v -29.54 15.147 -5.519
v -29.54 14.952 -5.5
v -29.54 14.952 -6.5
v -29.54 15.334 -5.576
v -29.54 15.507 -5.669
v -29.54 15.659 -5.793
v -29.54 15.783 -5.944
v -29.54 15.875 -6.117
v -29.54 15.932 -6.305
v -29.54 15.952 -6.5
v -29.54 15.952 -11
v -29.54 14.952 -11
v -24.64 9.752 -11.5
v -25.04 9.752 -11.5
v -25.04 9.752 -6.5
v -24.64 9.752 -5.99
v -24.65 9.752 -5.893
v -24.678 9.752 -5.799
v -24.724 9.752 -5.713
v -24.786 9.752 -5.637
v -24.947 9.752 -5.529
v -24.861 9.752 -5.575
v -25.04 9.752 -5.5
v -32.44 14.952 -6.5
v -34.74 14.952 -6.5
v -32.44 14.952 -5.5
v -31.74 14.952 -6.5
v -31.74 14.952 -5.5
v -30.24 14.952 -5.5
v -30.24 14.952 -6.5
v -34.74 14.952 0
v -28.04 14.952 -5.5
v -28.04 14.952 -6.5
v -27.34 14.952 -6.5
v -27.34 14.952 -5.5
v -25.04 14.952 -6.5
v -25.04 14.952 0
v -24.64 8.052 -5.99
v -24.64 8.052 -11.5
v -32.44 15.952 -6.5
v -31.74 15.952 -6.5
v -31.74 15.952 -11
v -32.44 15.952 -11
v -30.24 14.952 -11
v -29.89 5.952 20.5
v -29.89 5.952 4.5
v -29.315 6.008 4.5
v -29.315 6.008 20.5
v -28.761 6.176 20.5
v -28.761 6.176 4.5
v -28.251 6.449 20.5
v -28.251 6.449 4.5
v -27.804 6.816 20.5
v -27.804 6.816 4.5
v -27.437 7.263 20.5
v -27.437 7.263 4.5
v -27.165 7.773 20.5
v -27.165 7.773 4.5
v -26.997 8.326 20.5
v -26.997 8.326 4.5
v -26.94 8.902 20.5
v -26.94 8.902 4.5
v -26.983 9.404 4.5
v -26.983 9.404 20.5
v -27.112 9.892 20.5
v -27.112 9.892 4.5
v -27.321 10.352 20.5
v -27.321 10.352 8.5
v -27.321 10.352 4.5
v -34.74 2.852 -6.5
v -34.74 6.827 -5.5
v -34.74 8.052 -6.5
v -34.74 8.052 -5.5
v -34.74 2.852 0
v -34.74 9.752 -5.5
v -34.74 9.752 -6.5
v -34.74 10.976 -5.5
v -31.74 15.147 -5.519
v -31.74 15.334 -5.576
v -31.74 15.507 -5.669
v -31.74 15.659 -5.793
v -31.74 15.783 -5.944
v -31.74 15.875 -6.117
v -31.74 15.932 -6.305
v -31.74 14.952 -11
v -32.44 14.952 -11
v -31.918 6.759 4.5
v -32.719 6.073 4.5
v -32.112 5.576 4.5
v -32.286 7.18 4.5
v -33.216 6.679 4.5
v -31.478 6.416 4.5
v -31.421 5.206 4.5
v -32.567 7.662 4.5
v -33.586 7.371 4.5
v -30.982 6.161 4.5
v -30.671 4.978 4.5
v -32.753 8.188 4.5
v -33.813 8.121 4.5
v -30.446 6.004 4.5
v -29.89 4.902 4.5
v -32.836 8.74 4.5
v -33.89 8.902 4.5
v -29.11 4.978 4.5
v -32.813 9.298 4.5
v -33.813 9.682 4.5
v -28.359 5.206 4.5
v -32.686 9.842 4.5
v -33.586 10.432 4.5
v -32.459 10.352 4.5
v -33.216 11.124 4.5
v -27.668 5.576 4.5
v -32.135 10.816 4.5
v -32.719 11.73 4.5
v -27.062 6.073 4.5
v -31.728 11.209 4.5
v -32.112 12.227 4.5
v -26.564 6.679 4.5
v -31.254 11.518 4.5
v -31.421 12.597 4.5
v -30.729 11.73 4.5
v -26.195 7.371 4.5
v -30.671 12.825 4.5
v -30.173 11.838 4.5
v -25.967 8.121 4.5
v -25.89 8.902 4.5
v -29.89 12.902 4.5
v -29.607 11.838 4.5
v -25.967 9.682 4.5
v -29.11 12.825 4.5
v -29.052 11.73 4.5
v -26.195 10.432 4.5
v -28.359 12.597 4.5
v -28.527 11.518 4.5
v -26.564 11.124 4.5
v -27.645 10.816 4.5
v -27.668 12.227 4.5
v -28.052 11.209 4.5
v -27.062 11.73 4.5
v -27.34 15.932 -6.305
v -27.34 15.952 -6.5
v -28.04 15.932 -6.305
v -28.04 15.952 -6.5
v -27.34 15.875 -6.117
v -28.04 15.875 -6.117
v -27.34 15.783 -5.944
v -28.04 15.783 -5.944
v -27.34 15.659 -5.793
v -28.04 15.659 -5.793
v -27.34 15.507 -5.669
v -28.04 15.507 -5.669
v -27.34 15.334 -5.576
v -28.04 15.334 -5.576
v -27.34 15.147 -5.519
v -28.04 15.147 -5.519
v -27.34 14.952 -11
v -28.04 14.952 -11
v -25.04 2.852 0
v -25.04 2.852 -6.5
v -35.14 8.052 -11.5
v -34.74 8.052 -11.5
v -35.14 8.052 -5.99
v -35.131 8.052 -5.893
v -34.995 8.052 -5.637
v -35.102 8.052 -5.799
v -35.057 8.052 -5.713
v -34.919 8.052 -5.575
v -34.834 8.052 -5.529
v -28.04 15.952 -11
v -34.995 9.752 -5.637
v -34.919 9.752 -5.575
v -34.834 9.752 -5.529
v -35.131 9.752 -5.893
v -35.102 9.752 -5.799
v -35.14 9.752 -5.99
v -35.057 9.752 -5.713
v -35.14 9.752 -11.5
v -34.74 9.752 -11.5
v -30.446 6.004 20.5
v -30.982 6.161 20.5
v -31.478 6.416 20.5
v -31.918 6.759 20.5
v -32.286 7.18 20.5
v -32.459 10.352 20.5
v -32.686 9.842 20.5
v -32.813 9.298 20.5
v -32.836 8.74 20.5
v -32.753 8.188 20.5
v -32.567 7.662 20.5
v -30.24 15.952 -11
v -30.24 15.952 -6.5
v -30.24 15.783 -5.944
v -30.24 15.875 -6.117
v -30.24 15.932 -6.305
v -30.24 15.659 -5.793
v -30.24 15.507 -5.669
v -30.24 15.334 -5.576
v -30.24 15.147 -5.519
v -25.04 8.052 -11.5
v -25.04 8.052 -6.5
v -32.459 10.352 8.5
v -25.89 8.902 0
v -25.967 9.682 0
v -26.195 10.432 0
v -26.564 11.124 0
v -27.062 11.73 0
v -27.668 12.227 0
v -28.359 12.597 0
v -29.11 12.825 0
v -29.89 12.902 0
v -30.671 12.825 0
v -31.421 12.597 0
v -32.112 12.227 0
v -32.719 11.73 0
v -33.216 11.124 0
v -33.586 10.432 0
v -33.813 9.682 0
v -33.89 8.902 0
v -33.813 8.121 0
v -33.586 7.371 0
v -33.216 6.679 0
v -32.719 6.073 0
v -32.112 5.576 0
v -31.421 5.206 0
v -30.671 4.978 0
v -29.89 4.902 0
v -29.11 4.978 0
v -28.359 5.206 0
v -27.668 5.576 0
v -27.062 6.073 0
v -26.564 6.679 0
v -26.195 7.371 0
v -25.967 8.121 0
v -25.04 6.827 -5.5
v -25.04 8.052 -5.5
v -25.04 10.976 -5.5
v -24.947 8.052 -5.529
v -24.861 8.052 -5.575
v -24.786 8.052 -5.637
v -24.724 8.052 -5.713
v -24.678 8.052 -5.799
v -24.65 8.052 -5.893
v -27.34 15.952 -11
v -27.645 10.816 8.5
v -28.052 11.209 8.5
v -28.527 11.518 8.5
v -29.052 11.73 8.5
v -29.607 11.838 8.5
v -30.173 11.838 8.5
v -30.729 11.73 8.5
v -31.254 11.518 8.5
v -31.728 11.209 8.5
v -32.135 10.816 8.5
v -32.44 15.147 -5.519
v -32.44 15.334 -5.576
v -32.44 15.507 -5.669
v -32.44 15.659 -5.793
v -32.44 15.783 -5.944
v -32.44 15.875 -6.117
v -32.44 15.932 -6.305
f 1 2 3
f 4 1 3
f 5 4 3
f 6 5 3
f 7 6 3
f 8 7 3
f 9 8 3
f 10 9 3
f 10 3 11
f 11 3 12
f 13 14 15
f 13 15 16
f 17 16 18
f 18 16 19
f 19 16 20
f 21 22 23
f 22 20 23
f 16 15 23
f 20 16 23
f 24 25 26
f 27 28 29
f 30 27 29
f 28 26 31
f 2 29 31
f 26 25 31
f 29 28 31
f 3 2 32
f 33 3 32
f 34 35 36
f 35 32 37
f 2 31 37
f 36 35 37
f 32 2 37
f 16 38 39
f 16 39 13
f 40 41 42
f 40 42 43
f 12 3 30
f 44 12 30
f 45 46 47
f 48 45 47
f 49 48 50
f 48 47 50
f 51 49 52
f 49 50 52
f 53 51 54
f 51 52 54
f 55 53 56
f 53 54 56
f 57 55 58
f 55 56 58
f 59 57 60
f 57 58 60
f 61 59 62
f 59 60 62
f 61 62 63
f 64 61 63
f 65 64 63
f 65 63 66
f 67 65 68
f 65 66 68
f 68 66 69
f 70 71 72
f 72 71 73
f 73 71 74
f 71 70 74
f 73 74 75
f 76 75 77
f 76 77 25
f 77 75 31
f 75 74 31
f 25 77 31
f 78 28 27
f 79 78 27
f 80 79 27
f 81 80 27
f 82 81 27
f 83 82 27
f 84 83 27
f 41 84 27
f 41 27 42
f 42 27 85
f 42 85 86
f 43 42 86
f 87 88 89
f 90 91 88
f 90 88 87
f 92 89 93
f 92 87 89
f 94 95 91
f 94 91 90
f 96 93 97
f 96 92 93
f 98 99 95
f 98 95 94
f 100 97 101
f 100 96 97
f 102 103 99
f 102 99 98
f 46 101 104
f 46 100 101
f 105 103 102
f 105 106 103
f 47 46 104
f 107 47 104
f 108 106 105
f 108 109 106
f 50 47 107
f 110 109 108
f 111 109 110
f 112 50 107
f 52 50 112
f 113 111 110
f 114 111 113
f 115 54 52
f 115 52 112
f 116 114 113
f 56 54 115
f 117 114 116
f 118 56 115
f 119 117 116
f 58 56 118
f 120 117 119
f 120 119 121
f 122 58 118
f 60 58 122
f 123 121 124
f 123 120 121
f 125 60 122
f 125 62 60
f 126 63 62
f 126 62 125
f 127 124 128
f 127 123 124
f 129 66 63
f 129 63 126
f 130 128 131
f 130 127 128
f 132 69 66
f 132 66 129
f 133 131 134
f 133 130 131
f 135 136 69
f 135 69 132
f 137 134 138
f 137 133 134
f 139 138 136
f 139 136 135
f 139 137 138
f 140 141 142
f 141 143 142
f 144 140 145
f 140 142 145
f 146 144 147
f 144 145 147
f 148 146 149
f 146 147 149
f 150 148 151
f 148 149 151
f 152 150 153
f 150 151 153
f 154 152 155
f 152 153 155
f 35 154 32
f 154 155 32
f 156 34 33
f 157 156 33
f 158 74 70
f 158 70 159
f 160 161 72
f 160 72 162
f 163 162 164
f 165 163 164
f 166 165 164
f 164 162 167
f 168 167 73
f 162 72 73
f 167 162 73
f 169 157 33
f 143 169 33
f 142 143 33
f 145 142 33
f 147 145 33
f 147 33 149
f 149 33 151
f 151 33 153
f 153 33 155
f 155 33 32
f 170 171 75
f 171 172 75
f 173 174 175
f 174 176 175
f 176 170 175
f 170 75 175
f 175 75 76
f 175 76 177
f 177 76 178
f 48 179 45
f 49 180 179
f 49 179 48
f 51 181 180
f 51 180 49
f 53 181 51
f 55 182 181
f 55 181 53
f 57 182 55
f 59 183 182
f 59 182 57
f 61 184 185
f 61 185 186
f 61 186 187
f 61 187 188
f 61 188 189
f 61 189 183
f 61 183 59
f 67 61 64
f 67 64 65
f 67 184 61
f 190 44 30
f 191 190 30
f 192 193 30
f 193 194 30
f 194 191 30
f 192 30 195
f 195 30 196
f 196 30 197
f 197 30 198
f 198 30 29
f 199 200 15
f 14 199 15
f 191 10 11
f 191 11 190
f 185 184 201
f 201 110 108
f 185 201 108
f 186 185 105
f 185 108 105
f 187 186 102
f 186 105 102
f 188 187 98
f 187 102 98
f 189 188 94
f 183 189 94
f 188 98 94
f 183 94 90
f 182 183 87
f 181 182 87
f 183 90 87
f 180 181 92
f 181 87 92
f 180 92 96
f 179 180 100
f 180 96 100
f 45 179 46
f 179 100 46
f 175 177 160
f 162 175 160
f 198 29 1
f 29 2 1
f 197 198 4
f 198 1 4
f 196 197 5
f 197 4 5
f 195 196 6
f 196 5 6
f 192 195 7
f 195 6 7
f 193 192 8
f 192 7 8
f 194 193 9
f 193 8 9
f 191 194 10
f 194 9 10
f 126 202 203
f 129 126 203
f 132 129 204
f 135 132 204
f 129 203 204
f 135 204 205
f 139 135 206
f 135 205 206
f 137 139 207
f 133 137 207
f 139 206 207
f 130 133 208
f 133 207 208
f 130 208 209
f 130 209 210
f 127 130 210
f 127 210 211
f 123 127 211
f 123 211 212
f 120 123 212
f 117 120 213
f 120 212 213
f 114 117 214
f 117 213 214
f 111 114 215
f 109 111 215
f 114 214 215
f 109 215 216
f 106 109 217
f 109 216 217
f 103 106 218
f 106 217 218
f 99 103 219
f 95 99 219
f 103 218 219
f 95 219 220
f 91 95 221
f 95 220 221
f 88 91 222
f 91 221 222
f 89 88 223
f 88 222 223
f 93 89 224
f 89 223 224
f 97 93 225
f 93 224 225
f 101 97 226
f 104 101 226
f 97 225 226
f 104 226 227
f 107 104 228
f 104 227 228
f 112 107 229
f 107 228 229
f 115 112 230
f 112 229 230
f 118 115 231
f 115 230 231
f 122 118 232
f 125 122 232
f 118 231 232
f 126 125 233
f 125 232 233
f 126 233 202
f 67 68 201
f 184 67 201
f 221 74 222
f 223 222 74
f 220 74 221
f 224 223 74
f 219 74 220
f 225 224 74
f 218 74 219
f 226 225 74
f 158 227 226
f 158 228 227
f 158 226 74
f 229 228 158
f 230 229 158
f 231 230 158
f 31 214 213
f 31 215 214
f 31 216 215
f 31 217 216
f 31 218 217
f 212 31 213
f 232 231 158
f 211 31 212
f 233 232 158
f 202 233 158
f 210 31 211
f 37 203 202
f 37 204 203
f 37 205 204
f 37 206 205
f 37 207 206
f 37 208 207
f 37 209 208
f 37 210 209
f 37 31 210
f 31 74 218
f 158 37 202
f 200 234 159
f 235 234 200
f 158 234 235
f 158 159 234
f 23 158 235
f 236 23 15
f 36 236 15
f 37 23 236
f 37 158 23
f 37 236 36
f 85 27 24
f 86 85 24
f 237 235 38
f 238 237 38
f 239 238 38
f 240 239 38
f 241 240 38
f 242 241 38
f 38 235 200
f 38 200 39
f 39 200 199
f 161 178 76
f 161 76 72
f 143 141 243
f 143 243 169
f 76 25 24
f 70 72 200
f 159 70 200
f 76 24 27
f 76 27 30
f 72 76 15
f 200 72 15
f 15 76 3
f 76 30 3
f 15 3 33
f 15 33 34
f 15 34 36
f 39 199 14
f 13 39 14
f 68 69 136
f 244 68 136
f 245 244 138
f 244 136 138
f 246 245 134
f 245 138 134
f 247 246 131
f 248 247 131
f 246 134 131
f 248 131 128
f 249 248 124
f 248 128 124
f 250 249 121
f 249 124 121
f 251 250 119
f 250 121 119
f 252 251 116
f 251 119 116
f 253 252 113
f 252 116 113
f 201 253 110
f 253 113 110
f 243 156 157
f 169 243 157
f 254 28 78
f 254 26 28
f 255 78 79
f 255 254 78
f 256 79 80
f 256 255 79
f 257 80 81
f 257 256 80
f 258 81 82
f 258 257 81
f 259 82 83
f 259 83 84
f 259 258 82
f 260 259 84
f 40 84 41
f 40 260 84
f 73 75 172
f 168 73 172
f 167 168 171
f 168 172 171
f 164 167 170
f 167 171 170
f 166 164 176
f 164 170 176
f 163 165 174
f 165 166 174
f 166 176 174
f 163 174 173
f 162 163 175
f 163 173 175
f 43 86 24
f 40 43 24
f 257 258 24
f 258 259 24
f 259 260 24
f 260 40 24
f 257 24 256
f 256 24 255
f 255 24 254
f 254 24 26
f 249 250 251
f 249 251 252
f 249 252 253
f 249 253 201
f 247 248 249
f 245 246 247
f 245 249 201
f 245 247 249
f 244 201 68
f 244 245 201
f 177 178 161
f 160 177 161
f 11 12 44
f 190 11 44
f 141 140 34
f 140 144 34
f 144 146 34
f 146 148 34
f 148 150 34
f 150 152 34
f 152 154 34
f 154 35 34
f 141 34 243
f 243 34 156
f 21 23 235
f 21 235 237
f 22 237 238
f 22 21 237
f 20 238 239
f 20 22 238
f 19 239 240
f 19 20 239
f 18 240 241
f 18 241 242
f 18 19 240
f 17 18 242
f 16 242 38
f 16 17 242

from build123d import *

# Parameters (mm, degrees)
F0_W         = 9.7
F0_H         = 12.1
F0_R         = 4
F1_DEPTH     = 6.5
F2_DEPTH     = 4.5
F4_DEPTH     = 16
F5_DEPTH     = 4
F6_W         = 0.7
F6_H         = 4.5
F6_H_2       = 1
F6_W_2       = 0.35
F7_DEPTH     = 1
F8_R         = 0.99999
F9_W         = 0.85
F9_H         = 1
F10_DEPTH    = 0.4
F11_T1_DEPTH = 4.1494897428
F12_W        = 0.85
F12_H        = 1
F13_DEPTH    = 0.4
F14_T1_DEPTH = 4.1494897428


# Not quite as in the source:
# - a fillet or chamfer that OpenCascade refuses, or shapes differently, is made with other operations: its cross-section is extruded or revolved along the edge and cut away or added
# - a fillet or chamfer is up to 0.001 mm smaller than in the source, because OpenCascade refuses the exact size


with BuildPart() as f1:
    # F0 (on Top) → F1 (new body)
    with BuildSketch(Plane.XY):
        with Locations((-29.8902173527, 8.9015606931)):
            Rectangle(F0_W, F0_H)
        with Locations((-29.8902173527, 8.9015606931)):
            Circle(F0_R, mode=Mode.SUBTRACT)
        with Locations((-29.8902173527, 8.9015606931)):
            Circle(F0_R)
    extrude(amount=-F1_DEPTH)

    # F0 (on Top) → F2 (join)
    with BuildSketch(Plane.XY):
        with Locations((-29.8902173527, 8.9015606931)):
            Circle(F0_R)
    extrude(amount=F2_DEPTH)

    # F3 (on face) → F4 (join)
    with BuildSketch(Plane.XY.offset(4.5)):
        with BuildLine():
            ThreePointArc((-32.4592638684, 10.3515606931), (-32.4377651932, 7.4141132151), (-29.8902173527, 5.9515606931))
            Line((-29.8902173527, 5.9515606931), (-29.8902173527, 10.3515606931))
            Line((-29.8902173527, 10.3515606931), (-32.4592638684, 10.3515606931))
        make_face()
        with BuildLine():
            ThreePointArc((-29.8902173527, 5.9515606931), (-27.8042523482, 6.8155956886), (-26.9402173527, 8.9015606931))
            ThreePointArc((-26.9402173527, 8.9015606931), (-27.0370448008, 9.6511648482), (-27.3211708369, 10.3515606931))
            Line((-27.3211708369, 10.3515606931), (-29.8902173527, 10.3515606931))
            Line((-29.8902173527, 10.3515606931), (-29.8902173527, 5.9515606931))
        make_face()
    extrude(amount=F4_DEPTH)

    # F3 (on face) → F5 (join)
    with BuildSketch(Plane.XY.offset(4.5)):
        with BuildLine():
            Line((-29.8902173527, 10.3515606931), (-27.3211708369, 10.3515606931))
            ThreePointArc((-27.3211708369, 10.3515606931), (-29.8902173527, 11.8515606931), (-32.4592638684, 10.3515606931))
            Line((-32.4592638684, 10.3515606931), (-29.8902173527, 10.3515606931))
        make_face()
    extrude(amount=F5_DEPTH)

    # F6 (on face) → F7 (join)
    with BuildSketch(Plane(origin=(0, 14.9515606931, 0), x_dir=(-1, 0, 0), z_dir=(0, 1, 0))):
        with Locations((27.6902173527, -8.75)):
            Rectangle(F6_W, F6_H)
        with Locations((27.6902173527, -6)):
            Rectangle(F6_W, F6_H_2)
        with Locations((29.7152173527, -6)):
            Rectangle(F6_W_2, F6_H_2)
        with Locations((30.0652173527, -6)):
            Rectangle(F6_W_2, F6_H_2)
        Polygon((30.2402173527, -11), (30.2402173527, -6.5), (29.8902173527, -6.5), (29.5402173527, -6.5), (29.5402173527, -11), align=None)
        with Locations((32.0902173527, -6)):
            Rectangle(F6_W, F6_H_2)
        with Locations((32.0902173527, -8.75)):
            Rectangle(F6_W, F6_H)
    extrude(amount=F7_DEPTH)

    # F8 (radius 1 in the source; OpenCascade refuses exactly that, so slightly less here)
    f8_edges = [f1.edges().sort_by_distance(p)[0] for p in [
        (-27.690217, 15.951561, -5.5),
        (-29.890217, 15.951561, -5.5),
        (-32.090217, 15.951561, -5.5),
    ]]
    fillet(f8_edges, radius=F8_R)

    # F9 (on face) → F10 (join)
    with BuildSketch(Plane.YZ.offset(-25.0402173527)):
        with Locations((8.4765606931, -6)):
            Rectangle(F9_W, F9_H)
        with Locations((9.3265606931, -6)):
            Rectangle(F9_W, F9_H)
        Polygon((9.7515606931, -6.5), (8.9015606931, -6.5), (8.0515606931, -6.5), (8.0515606931, -11.5), (9.7515606931, -11.5), align=None)
    extrude(amount=F10_DEPTH)

    # F11: fillet of radius 0.5 on 1 edges, made by hand

    # F11_s2 → F11_t1 (cut)
    with BuildSketch(Plane.XZ.offset(-10.9763055645)):
        with BuildLine():
            ThreePointArc((-25.0402173527, -5.5), (-24.752919018, -5.6736701825), (-24.6402173527, -5.9898979486))
            Line((-24.6402173527, -5.9898979486), (-24.6402173527, -5.5))
            Line((-24.6402173527, -5.5), (-25.0402173527, -5.5))
        make_face()
    extrude(amount=F11_T1_DEPTH, mode=Mode.SUBTRACT)

    # F12 (on face) → F13 (join)
    with BuildSketch(Plane(origin=(-34.7402173527, 0, 0), x_dir=(0, -1, 0), z_dir=(-1, 0, 0))):
        with Locations((-9.3265606931, -6)):
            Rectangle(F12_W, F12_H)
        with Locations((-8.4765606931, -6)):
            Rectangle(F12_W, F12_H)
        Polygon((-8.9015606931, -6.5), (-9.7515606931, -6.5), (-9.7515606931, -11.5), (-8.0515606931, -11.5), (-8.0515606931, -6.5), align=None)
    extrude(amount=F13_DEPTH)

    # F14: fillet of radius 0.5 on 1 edges, made by hand

    # F14_s2 → F14_t1 (cut)
    with BuildSketch(Plane.XZ.offset(-10.9763055645)):
        with BuildLine():
            ThreePointArc((-34.7402173527, -5.5), (-35.0275156873, -5.6736701825), (-35.1402173527, -5.9898979486))
            Line((-35.1402173527, -5.9898979486), (-35.1402173527, -5.5))
            Line((-35.1402173527, -5.5), (-34.7402173527, -5.5))
        make_face()
    extrude(amount=F14_T1_DEPTH, mode=Mode.SUBTRACT)


solid = f1.part
